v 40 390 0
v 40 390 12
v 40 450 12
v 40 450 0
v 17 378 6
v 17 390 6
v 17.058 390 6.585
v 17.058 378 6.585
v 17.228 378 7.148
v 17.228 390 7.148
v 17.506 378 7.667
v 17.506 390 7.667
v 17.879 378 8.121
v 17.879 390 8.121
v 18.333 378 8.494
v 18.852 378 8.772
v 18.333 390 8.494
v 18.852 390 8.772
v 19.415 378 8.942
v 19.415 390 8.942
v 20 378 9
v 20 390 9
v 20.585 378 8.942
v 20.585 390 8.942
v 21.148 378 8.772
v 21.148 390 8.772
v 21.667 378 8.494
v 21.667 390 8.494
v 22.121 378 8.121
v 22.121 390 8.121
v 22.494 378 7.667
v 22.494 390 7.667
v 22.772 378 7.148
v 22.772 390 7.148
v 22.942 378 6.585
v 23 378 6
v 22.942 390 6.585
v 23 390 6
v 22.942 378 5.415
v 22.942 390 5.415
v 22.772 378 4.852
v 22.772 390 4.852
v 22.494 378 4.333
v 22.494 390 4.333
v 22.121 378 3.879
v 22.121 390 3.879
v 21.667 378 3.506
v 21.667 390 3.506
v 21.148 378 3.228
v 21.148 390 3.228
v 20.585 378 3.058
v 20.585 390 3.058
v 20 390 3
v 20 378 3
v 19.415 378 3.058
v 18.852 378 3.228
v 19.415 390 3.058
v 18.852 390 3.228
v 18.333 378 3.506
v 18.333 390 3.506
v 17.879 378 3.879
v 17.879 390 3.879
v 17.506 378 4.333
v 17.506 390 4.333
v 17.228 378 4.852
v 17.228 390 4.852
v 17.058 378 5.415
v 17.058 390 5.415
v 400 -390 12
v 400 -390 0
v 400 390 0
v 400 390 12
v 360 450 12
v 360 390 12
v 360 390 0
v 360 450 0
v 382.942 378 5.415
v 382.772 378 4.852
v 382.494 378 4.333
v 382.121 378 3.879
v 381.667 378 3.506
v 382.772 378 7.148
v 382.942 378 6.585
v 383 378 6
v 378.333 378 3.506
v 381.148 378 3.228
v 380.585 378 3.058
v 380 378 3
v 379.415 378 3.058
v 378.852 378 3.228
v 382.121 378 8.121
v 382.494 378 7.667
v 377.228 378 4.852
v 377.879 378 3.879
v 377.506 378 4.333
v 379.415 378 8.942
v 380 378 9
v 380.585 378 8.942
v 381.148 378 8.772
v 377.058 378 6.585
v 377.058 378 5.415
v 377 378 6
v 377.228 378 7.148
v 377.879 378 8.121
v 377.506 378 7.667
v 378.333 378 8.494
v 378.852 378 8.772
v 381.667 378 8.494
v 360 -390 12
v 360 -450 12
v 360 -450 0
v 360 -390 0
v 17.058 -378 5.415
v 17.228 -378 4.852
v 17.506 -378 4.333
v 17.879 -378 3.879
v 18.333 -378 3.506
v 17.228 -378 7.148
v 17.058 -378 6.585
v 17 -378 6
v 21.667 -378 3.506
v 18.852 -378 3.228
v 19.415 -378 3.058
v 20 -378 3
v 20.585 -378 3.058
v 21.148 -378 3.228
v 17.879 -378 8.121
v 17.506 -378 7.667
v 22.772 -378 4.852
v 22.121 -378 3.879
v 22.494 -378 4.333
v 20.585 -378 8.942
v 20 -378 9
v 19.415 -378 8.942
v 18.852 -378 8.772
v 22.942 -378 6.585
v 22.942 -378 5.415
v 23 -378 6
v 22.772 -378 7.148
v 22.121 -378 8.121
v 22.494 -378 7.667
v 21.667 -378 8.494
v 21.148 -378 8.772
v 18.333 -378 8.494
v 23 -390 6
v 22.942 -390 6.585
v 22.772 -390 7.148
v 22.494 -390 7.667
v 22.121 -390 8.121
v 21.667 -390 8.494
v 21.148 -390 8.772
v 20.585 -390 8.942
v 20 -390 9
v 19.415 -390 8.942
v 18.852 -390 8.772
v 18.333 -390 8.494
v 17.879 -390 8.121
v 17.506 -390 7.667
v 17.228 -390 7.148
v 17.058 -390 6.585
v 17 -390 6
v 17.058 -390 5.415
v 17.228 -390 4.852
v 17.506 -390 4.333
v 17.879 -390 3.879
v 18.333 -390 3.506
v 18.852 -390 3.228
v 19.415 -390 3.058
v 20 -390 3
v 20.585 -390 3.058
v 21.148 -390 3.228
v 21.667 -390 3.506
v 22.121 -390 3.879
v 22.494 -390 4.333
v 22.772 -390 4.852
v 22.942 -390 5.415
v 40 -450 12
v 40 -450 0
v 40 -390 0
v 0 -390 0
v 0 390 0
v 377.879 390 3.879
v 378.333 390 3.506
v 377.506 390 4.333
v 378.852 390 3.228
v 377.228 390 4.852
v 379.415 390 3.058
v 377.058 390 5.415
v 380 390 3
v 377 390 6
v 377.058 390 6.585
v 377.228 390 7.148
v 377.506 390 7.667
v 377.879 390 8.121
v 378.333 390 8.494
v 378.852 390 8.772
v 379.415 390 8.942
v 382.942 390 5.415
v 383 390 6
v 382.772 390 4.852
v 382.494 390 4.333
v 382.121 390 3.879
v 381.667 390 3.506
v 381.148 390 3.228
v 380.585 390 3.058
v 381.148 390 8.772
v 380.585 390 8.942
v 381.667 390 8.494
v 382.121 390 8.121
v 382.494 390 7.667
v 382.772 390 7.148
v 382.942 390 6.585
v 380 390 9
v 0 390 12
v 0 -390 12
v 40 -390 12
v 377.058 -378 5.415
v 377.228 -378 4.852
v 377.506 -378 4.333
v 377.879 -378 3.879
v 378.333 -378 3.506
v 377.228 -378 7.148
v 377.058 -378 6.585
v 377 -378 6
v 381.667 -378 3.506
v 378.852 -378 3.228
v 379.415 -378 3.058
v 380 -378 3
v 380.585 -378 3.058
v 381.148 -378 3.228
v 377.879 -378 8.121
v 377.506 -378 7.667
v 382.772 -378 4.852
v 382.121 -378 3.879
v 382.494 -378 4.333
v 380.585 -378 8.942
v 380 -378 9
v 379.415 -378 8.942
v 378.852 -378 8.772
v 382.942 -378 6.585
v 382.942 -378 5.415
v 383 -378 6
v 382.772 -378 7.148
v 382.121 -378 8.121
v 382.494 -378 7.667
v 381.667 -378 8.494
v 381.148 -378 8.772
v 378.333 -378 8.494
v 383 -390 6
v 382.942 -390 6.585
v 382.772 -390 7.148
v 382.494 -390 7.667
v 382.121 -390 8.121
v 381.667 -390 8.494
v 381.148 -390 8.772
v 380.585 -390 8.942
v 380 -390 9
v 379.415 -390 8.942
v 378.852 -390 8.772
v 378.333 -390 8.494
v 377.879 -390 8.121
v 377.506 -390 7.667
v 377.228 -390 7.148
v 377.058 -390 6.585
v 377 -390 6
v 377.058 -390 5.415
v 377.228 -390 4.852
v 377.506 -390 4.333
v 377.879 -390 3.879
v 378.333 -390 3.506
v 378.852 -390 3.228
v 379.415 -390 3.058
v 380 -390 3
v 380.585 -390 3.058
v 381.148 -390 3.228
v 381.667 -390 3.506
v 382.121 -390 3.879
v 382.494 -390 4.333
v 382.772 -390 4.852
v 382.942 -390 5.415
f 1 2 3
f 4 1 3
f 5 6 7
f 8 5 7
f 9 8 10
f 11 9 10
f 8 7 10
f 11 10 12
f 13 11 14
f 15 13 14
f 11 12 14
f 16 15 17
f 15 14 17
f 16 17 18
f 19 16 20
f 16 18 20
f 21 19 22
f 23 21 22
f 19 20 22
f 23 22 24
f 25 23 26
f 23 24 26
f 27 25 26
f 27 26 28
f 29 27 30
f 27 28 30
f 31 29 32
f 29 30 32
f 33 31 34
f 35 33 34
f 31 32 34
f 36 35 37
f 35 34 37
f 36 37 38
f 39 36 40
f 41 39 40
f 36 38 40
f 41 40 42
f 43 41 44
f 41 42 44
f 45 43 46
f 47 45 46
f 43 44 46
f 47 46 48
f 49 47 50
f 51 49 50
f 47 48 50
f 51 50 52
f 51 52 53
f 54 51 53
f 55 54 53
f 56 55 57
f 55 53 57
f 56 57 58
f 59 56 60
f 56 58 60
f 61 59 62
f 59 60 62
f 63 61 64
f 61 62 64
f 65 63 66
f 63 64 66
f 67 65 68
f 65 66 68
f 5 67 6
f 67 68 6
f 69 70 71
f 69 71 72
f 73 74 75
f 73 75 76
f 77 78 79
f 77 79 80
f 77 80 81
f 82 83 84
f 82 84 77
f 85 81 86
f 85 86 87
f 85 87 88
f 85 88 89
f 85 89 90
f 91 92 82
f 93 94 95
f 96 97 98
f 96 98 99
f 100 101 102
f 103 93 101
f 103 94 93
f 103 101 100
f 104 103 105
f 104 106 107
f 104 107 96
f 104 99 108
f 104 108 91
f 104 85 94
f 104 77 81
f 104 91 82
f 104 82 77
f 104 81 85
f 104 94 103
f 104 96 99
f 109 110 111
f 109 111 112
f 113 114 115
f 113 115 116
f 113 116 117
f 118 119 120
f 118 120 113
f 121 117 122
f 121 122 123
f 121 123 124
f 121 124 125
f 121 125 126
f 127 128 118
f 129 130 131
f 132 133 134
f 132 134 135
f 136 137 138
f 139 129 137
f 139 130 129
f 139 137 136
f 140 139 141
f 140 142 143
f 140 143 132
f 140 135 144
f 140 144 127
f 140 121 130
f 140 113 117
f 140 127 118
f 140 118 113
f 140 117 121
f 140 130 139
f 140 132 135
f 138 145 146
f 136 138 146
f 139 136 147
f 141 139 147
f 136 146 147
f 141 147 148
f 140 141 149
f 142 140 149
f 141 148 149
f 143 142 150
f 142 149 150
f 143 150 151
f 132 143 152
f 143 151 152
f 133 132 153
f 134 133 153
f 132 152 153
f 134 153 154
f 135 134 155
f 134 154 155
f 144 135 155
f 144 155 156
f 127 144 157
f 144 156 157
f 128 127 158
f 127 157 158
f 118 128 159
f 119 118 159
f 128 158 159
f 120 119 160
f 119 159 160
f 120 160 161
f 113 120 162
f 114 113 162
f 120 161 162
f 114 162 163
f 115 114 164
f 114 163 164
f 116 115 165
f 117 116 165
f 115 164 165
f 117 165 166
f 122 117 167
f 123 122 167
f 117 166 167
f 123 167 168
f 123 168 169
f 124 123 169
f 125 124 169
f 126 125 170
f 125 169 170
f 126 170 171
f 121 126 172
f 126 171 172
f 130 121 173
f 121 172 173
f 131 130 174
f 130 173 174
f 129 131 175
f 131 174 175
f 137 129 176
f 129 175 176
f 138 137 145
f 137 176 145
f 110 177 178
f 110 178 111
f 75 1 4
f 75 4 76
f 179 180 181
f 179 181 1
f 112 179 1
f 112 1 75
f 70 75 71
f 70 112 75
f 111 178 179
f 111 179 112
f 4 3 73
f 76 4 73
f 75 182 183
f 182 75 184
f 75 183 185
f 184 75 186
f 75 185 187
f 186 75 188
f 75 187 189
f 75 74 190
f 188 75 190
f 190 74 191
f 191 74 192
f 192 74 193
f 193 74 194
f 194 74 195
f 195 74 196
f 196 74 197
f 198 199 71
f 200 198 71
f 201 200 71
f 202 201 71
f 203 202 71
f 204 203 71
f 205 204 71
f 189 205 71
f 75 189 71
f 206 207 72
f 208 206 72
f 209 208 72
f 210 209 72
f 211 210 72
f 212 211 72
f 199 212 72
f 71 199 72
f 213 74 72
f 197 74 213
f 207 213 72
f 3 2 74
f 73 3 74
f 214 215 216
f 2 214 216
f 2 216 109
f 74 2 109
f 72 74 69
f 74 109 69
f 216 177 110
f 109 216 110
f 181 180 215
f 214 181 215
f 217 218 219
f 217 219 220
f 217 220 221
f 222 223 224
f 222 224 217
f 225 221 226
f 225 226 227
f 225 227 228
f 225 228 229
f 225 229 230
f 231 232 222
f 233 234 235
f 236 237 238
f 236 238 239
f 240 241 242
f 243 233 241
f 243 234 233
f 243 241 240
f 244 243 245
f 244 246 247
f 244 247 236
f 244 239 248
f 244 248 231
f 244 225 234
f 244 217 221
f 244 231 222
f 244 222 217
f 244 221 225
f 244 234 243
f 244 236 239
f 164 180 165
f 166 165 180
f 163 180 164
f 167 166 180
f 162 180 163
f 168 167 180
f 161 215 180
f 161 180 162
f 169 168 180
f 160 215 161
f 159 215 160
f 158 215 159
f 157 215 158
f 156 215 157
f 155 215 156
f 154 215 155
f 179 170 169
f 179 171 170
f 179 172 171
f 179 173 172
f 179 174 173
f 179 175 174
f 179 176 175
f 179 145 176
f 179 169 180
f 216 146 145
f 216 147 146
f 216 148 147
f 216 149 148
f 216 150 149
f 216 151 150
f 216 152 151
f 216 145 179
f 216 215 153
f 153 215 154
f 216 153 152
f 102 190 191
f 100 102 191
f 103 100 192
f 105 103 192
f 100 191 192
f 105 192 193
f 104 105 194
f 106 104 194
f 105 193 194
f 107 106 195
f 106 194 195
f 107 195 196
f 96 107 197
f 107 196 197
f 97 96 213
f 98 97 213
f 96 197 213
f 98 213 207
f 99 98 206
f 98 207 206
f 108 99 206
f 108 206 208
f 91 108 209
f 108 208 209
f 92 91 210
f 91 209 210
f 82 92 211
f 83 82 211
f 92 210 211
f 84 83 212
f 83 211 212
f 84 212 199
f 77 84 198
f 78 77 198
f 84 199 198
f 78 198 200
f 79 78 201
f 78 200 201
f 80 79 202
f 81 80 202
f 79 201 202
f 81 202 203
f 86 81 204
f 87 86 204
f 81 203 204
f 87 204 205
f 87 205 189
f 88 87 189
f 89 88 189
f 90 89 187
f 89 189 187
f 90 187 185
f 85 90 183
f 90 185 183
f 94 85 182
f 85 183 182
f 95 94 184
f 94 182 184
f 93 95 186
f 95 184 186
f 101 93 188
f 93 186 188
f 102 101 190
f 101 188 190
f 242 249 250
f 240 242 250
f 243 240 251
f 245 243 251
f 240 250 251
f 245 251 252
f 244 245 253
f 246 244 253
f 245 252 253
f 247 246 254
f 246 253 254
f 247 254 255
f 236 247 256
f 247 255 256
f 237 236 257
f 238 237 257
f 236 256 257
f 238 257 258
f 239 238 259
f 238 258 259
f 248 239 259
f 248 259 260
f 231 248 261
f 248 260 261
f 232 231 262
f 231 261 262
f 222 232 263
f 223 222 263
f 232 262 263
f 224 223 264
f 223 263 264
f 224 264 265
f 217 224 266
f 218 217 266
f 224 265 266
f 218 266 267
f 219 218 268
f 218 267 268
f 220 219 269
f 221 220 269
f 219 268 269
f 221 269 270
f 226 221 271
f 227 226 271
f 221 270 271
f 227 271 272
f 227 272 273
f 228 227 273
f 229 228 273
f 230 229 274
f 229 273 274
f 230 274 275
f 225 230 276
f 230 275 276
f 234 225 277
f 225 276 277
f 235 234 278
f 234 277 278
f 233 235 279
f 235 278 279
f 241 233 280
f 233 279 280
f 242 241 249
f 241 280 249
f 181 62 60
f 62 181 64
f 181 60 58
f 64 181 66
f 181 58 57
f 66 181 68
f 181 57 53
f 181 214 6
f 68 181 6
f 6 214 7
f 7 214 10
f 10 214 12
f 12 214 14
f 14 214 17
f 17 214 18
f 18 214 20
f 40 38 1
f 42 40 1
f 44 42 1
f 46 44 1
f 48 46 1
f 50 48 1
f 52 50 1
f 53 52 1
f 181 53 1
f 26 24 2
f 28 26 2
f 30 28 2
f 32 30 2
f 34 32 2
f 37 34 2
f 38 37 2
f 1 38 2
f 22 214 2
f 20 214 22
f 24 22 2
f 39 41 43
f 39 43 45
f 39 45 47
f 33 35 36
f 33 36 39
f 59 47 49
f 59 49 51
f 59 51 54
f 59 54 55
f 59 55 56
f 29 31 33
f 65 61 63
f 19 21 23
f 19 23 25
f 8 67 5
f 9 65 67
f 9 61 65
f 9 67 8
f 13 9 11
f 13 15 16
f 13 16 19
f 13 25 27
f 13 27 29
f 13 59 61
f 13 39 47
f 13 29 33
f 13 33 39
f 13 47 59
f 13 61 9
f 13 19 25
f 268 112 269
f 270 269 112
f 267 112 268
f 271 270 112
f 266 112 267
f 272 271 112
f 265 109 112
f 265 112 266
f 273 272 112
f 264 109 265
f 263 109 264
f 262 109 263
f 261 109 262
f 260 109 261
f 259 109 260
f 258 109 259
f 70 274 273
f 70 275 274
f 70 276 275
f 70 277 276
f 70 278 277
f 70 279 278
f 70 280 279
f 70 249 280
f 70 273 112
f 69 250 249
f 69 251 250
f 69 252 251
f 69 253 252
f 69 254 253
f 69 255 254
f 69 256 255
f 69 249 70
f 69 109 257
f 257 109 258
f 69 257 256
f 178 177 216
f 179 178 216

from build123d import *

# Parameters (mm, degrees)
F0_W      = 400
F0_H      = 12
F1_DEPTH  = 450
F2_W      = 40
F2_H      = 60
F3_DEPTH  = 12
F4_W      = 40
F4_H      = 60
F5_DEPTH  = 15
F6_W      = 40
F6_H      = 60
F7_DEPTH  = 15
F8_W      = 40
F8_H      = 60
F9_DEPTH  = 15
F10_R     = 3
F11_DEPTH = 12
F12_R     = 3
F13_DEPTH = 12
F14_R     = 3
F15_DEPTH = 12
F16_R     = 3
F17_DEPTH = 12


with BuildPart() as f1:
    # F0 (on Front) → F1 (new body, symmetric)
    with BuildSketch(Plane.XZ):
        with Locations((200, 6)):
            Rectangle(F0_W, F0_H)
    extrude(amount=F1_DEPTH, both=True)

    # F2 (on face) → F3 (cut)
    with BuildSketch(Plane.XY.offset(12)):
        with Locations((20, 420)):
            Rectangle(F2_W, F2_H)
    extrude(amount=-F3_DEPTH, mode=Mode.SUBTRACT)

    # F4 (on face) → F5 (cut)
    with BuildSketch(Plane.XY.offset(12)):
        with Locations((380, 420)):
            Rectangle(F4_W, F4_H)
    extrude(amount=-F5_DEPTH, mode=Mode.SUBTRACT)

    # F6 (on face) → F7 (cut)
    with BuildSketch(Plane.XY.offset(12)):
        with Locations((380, -420)):
            Rectangle(F6_W, F6_H)
    extrude(amount=-F7_DEPTH, mode=Mode.SUBTRACT)

    # F8 (on face) → F9 (cut)
    with BuildSketch(Plane.XY.offset(12)):
        with Locations((20, -420)):
            Rectangle(F8_W, F8_H)
    extrude(amount=-F9_DEPTH, mode=Mode.SUBTRACT)

    # F10 (on face) → F11 (cut)
    with BuildSketch(Plane.XZ.offset(390)):
        with Locations((20, 6)):
            Circle(F10_R)
    extrude(amount=-F11_DEPTH, mode=Mode.SUBTRACT)

    # F12 (on face) → F13 (cut)
    with BuildSketch(Plane.XZ.offset(390)):
        with Locations((380, 6)):
            Circle(F12_R)
    extrude(amount=-F13_DEPTH, mode=Mode.SUBTRACT)

    # F14 (on face) → F15 (cut)
    with BuildSketch(Plane(origin=(0, 390, 0), x_dir=(-1, 0, 0), z_dir=(0, 1, 0))):
        with Locations((-380, 6)):
            Circle(F14_R)
    extrude(amount=-F15_DEPTH, mode=Mode.SUBTRACT)

    # F16 (on face) → F17 (cut)
    with BuildSketch(Plane(origin=(0, 390, 0), x_dir=(-1, 0, 0), z_dir=(0, 1, 0))):
        with Locations((-20, 6)):
            Circle(F16_R)
    extrude(amount=-F17_DEPTH, mode=Mode.SUBTRACT)


solid = f1.part
